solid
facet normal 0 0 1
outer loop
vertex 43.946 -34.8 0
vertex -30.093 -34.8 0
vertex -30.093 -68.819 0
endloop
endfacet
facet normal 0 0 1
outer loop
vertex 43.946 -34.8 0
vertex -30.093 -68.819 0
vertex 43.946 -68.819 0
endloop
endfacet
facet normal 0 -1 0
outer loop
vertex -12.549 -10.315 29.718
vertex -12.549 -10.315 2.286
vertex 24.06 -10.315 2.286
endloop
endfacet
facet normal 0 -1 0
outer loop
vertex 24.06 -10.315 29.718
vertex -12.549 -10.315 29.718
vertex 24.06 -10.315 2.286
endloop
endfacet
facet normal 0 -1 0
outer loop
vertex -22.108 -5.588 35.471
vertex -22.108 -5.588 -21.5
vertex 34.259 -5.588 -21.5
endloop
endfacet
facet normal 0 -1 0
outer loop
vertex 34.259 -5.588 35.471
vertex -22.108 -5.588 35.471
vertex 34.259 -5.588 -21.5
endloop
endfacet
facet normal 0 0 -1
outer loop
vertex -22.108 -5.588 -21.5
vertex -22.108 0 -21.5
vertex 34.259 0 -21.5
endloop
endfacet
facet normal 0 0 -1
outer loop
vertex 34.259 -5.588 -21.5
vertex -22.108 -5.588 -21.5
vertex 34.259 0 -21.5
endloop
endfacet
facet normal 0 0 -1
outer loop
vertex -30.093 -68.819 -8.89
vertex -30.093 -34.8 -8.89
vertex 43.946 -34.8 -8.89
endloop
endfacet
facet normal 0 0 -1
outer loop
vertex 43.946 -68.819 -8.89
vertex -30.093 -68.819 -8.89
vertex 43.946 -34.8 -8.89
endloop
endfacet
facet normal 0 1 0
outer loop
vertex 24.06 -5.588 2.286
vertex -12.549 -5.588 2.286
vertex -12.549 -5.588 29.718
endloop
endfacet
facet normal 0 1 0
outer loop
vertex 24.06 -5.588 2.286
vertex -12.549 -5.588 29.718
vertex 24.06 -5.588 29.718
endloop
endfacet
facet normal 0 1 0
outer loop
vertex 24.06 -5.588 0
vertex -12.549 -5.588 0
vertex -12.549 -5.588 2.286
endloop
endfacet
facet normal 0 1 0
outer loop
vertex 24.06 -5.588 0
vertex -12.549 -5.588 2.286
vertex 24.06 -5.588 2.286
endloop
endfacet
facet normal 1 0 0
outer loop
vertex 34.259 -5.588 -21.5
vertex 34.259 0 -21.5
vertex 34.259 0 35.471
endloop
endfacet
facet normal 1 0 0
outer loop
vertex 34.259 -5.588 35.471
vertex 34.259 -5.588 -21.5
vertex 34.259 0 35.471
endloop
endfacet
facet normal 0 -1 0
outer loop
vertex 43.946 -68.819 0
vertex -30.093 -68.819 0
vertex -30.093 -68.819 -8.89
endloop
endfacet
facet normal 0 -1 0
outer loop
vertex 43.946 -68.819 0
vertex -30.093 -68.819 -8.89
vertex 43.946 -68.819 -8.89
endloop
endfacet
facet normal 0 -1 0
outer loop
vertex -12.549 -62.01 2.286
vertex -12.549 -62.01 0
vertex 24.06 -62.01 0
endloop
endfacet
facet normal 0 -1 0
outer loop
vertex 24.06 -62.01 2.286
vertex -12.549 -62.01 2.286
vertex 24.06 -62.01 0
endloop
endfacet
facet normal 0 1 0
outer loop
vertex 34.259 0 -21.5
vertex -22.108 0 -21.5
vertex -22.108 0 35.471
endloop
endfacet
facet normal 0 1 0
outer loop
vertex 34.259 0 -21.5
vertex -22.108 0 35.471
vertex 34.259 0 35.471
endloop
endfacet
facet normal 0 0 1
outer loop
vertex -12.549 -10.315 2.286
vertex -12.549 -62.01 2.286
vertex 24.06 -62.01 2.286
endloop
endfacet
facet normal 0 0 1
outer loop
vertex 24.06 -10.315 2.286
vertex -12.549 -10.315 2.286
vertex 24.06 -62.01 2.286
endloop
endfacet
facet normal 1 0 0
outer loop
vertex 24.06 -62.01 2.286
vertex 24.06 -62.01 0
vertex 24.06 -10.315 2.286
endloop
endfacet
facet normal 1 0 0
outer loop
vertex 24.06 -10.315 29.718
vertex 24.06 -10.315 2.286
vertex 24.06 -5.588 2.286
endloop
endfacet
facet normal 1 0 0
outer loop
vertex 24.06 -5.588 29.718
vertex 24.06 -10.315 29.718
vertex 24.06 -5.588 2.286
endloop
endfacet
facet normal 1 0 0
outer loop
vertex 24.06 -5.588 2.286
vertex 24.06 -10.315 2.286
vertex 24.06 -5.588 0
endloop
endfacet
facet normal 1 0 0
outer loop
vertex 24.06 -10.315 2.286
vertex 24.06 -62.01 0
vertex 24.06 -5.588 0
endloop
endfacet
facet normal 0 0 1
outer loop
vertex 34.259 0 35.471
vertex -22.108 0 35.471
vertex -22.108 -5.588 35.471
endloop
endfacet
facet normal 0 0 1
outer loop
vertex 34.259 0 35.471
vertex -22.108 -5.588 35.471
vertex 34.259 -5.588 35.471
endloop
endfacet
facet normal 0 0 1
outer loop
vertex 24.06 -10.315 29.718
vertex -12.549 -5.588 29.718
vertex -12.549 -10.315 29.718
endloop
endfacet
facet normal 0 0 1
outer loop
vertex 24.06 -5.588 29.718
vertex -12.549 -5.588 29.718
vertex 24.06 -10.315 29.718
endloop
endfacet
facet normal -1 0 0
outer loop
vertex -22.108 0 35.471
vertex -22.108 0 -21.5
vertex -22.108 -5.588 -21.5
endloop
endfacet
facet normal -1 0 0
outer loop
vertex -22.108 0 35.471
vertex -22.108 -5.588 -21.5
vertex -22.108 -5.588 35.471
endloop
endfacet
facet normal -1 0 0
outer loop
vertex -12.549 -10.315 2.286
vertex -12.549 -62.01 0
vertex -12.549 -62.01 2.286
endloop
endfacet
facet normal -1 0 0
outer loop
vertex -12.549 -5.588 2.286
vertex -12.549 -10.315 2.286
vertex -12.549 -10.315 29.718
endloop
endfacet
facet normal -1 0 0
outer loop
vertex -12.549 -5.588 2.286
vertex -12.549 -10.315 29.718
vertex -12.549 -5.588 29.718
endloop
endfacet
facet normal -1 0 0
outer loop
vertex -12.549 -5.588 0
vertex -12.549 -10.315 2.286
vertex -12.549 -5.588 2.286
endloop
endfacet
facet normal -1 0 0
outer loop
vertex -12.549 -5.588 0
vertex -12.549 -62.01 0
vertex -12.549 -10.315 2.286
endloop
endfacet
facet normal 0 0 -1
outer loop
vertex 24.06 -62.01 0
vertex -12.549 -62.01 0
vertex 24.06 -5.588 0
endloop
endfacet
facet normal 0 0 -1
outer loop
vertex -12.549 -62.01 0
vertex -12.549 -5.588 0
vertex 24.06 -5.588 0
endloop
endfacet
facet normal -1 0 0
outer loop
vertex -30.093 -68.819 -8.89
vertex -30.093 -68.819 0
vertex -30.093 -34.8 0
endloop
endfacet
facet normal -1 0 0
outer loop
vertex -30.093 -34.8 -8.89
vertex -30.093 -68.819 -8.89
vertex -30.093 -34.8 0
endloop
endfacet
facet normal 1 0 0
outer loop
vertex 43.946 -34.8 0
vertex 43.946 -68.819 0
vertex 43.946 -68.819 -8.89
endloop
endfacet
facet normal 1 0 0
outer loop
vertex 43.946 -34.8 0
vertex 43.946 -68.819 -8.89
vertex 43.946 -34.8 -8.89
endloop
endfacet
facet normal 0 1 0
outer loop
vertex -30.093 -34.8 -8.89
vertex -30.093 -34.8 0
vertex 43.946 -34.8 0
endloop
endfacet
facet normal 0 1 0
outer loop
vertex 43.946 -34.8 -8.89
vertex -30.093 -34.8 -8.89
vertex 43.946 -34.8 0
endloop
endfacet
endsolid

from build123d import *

# Parameters (mm, degrees)
F0_W     = 56.3671849668
F0_H     = 56.9717865437
F1_DEPTH = 5.588
F2_W     = 74.0387253463
F2_H     = 34.019369632
F3_DEPTH = 8.89
F4_W     = 36.6083486006
F4_H     = 27.2100468283
F4_H_2   = 29.2121010716
F5_DEPTH = 2.286
F6_W     = 36.6083486006
F6_H     = 4.7270159121
F7_DEPTH = 27.432


with BuildPart() as f1:
    # F0 (on Front) → F1 (new body)
    with BuildSketch(Plane.XZ):
        with Locations((6.0755070299, 6.9855386391)):
            Rectangle(F0_W, F0_H)
    extrude(amount=F1_DEPTH)


with BuildPart() as f3:
    # F2 (on Top) → F3 (new body)
    with BuildSketch(Plane.XY):
        with Locations((6.926542148, -51.8097858876)):
            Rectangle(F2_W, F2_H)
    extrude(amount=-F3_DEPTH)


with BuildPart() as f5:
    # F4 (on face) → F5 (new body)
    with BuildSketch(Plane.XY):
        with Locations((5.755436141, -48.4051244857)):
            Rectangle(F4_W, F4_H)
        with Locations((5.755436141, -20.1940505358)):
            Rectangle(F4_W, F4_H_2)
    extrude(amount=F5_DEPTH)

    # F6 (on face) → F7 (join)
    with BuildSketch(Plane.XY.offset(2.286)):
        with Locations((5.755436141, -7.951507956)):
            Rectangle(F6_W, F6_H)
    extrude(amount=F7_DEPTH)


solid = Compound([f1.part, f3.part, f5.part])
